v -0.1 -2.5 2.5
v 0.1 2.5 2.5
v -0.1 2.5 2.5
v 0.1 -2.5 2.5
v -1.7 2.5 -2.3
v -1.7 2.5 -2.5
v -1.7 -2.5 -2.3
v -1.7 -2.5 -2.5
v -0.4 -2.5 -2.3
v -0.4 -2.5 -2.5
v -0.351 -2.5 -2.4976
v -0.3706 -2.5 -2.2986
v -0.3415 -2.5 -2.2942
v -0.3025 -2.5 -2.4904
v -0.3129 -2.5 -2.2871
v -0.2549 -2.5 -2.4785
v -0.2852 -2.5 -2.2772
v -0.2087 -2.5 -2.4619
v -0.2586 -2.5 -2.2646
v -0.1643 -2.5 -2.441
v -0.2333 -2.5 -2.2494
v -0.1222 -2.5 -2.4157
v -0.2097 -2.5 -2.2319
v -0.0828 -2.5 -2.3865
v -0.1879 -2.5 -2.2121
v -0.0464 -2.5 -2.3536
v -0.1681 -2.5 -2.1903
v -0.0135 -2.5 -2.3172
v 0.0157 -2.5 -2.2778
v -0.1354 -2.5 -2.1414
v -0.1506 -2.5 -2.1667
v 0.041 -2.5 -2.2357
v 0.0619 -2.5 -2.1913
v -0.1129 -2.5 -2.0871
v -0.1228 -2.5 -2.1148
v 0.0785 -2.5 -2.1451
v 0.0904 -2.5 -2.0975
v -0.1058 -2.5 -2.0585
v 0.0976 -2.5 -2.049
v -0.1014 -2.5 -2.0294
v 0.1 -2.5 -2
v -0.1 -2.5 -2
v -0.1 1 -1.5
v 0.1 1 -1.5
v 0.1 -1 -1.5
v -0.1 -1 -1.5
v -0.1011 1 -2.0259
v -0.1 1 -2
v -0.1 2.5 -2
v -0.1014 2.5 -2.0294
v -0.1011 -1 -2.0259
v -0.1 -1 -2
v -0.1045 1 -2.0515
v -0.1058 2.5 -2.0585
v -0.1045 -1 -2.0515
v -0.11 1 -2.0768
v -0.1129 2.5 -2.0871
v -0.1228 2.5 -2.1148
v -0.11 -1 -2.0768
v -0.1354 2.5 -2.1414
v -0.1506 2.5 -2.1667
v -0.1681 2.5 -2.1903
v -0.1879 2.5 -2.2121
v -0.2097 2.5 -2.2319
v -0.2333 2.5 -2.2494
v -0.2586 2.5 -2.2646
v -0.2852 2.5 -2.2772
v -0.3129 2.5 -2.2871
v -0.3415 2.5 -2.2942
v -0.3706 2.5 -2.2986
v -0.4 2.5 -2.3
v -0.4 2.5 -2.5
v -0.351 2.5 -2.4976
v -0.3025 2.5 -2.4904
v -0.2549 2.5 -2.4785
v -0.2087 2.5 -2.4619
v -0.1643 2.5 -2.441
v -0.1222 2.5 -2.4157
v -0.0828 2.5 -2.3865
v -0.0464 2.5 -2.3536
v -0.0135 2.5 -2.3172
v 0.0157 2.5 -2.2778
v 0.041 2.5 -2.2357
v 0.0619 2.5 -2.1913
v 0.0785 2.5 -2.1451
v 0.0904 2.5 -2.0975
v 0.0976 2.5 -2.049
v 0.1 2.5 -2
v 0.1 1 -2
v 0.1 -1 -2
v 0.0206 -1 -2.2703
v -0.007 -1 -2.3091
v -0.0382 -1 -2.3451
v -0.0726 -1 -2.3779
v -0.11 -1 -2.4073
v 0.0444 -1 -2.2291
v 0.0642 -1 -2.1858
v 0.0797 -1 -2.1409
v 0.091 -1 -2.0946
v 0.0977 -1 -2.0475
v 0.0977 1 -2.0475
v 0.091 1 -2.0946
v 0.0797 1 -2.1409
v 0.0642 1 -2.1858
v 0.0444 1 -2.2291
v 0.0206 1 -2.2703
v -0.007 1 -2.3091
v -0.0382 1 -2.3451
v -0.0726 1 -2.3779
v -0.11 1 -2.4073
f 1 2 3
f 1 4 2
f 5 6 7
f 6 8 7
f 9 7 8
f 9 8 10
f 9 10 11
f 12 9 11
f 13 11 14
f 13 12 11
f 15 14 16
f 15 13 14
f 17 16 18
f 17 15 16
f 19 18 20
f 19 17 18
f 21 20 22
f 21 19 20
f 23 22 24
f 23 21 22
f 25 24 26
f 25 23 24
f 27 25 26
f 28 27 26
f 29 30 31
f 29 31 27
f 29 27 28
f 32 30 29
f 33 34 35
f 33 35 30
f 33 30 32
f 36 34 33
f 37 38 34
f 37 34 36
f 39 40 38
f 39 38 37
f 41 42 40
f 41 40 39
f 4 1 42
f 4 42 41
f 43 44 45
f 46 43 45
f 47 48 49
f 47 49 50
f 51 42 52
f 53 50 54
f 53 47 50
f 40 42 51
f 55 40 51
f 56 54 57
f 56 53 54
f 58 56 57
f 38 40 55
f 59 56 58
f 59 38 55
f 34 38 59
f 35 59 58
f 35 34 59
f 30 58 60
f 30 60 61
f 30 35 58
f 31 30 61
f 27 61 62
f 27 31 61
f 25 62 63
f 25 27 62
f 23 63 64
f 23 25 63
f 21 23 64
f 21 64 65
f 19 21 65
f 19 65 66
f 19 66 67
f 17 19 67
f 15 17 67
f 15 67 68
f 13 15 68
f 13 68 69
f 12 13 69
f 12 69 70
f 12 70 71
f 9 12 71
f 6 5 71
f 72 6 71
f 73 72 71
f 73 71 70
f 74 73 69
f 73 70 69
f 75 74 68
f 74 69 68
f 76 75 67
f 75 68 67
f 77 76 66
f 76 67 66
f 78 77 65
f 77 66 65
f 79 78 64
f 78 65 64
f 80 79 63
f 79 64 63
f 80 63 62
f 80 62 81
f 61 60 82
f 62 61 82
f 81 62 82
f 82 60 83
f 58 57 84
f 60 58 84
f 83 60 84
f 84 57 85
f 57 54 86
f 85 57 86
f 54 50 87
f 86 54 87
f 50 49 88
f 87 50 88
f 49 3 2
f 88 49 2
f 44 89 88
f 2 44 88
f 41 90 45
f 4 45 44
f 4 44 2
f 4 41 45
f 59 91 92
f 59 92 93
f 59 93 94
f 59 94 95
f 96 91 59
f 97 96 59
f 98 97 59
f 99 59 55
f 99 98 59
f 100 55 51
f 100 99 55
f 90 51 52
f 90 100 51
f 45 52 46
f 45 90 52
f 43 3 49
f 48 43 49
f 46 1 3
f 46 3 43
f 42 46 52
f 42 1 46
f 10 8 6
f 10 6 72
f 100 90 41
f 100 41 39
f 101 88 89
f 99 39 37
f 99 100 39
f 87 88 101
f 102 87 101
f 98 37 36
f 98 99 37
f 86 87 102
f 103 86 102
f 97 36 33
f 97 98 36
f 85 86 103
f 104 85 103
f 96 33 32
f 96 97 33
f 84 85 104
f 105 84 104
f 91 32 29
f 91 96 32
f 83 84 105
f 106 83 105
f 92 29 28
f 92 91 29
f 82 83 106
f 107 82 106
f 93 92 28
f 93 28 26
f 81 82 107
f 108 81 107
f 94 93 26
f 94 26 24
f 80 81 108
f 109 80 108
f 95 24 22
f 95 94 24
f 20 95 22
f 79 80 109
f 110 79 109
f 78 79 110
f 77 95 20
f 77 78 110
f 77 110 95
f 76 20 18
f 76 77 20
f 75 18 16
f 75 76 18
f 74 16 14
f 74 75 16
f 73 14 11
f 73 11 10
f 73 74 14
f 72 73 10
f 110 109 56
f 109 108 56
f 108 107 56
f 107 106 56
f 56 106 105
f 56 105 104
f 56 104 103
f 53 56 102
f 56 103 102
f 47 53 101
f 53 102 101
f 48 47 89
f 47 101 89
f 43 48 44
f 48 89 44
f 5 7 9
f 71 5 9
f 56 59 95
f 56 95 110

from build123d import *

# Parameters (mm, degrees)
F0_W     = 1.6
F0_H     = 0.2
F1_DEPTH = 2.5
F2_W     = 1
F2_H     = 1
F3_DEPTH = 0.21
F4_R     = 0.3
F5_R     = 0.5


with BuildPart() as f1:
    # F0 (on Front) → F1 (new body, symmetric)
    with BuildSketch(Plane.XZ):
        Polygon((0.1, 2.5), (-0.1, 2.5), (-0.1, -2.3), (-0.1, -2.5), (0.1, -2.5), align=None)
        with Locations((-0.9, -2.4)):
            Rectangle(F0_W, F0_H)
    extrude(amount=F1_DEPTH, both=True)

    # F2 (on face) → F3 (cut)
    with BuildSketch(Plane.YZ.offset(0.1)):
        with Locations((-0.5, -2)):
            Rectangle(F2_W, F2_H)
        with Locations((0.5, -2)):
            Rectangle(F2_W, F2_H)
    extrude(amount=-F3_DEPTH, mode=Mode.SUBTRACT)

    # F4
    f4_edges = [f1.edges().sort_by_distance(p)[0] for p in [
        (-0.1, -1.75, -2.3),
    ]]
    fillet(f4_edges, radius=F4_R)

    # F5
    f5_edges = [f1.edges().sort_by_distance(p)[0] for p in [
        (0.1, -1.75, -2.5),
    ]]
    fillet(f5_edges, radius=F5_R)


solid = f1.part
